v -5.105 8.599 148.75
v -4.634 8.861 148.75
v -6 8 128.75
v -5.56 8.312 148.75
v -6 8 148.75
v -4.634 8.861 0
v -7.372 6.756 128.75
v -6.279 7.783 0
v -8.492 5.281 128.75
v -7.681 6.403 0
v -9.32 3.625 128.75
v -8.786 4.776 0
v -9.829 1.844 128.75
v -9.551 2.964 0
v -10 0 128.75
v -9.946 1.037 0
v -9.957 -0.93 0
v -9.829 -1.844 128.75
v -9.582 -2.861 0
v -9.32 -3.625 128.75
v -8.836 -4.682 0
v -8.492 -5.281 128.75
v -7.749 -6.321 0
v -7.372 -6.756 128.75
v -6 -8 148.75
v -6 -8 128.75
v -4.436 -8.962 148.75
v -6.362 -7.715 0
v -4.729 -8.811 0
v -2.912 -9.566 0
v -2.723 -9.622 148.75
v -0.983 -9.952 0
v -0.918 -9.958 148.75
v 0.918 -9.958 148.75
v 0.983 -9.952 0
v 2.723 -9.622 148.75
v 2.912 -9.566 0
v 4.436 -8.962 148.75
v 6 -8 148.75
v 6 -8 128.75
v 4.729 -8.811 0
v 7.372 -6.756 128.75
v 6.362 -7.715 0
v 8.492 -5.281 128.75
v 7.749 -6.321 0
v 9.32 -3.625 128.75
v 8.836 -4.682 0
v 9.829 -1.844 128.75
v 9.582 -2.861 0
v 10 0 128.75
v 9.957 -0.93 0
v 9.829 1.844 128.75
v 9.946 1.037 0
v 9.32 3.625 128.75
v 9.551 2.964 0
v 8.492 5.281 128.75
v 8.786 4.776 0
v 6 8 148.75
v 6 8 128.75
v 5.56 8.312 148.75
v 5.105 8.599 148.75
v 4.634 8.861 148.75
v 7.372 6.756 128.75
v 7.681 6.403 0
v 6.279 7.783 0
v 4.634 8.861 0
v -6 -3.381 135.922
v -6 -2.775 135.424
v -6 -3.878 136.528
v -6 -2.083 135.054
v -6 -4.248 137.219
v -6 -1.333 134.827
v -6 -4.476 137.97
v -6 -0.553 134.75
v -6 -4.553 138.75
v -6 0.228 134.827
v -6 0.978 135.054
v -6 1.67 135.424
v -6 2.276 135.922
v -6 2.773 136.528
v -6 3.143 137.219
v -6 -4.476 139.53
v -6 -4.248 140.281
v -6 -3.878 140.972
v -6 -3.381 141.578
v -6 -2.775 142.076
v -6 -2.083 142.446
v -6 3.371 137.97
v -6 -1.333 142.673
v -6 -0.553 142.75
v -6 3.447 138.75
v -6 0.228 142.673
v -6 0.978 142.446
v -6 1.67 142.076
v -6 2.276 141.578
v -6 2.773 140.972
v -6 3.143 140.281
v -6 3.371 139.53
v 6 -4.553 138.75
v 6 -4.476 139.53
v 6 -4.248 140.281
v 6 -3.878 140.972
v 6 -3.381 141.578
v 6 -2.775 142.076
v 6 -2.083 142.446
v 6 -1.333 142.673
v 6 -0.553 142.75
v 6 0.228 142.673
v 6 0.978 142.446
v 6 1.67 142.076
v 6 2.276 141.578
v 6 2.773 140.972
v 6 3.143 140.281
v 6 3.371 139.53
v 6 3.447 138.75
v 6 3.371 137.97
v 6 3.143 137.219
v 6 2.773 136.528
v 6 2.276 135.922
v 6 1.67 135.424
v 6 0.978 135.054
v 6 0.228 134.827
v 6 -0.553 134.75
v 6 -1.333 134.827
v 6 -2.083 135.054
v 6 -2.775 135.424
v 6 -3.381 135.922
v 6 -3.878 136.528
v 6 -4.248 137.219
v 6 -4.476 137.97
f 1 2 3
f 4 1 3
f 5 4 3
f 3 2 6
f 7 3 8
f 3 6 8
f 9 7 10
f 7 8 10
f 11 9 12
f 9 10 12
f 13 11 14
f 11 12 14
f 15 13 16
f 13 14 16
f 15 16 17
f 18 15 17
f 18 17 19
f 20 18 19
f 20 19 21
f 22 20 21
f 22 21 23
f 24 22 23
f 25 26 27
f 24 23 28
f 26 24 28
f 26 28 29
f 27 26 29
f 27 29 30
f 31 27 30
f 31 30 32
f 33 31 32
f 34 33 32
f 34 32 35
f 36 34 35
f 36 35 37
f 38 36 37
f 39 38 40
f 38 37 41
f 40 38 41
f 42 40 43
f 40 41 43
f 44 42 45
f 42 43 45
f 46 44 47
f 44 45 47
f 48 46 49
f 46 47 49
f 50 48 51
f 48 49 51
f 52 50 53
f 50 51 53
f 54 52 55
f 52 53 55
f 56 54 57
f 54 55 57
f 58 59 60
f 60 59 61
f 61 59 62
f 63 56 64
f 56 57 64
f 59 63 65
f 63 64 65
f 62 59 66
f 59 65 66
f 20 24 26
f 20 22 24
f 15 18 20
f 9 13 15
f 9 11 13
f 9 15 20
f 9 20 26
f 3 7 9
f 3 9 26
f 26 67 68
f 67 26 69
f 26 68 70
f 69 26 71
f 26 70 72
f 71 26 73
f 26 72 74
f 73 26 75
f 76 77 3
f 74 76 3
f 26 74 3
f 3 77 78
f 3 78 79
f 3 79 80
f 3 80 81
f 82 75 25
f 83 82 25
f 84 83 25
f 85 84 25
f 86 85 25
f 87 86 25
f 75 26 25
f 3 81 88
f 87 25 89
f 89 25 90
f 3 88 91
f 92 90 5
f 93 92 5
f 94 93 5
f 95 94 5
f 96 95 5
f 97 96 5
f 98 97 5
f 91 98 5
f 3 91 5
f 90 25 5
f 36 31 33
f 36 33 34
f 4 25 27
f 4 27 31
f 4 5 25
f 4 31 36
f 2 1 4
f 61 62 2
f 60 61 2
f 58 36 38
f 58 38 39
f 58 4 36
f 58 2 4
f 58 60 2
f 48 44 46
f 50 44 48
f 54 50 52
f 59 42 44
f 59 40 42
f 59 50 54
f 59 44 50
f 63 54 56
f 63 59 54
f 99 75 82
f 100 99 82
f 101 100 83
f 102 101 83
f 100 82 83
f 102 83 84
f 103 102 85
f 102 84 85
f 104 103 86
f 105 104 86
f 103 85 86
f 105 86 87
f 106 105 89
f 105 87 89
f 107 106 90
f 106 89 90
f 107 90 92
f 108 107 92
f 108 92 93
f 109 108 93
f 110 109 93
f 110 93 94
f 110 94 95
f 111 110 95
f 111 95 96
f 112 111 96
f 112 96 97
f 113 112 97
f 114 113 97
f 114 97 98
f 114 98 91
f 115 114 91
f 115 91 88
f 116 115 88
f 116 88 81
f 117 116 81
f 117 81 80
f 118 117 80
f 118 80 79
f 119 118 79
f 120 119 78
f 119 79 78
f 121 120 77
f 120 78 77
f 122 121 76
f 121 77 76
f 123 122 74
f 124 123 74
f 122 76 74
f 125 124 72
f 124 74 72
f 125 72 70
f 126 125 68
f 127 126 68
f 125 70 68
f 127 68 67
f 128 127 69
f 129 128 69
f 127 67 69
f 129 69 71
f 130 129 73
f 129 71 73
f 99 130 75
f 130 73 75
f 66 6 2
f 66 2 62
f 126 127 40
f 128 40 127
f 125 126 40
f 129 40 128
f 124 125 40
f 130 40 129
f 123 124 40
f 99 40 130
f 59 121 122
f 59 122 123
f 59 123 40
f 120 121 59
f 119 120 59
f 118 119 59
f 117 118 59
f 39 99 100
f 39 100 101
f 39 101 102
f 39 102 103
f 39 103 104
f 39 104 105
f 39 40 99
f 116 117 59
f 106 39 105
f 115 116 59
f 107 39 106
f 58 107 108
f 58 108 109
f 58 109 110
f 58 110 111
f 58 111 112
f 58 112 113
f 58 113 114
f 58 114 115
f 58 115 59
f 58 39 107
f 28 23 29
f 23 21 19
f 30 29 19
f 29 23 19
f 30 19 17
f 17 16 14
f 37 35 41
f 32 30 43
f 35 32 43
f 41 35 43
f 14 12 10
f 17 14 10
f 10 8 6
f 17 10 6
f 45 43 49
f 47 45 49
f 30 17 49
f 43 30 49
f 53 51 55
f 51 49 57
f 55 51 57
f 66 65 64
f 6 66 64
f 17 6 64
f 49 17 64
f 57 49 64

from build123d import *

# Parameters (mm, degrees)
CROQUIS1_R              = 10
SALIENTE_EXTRUIR1_DEPTH = 148.75
CROQUIS2_W              = 8.300476758
CROQUIS2_H              = 25.089011669
CROQUIS2_W_2            = 8.253581409
CROQUIS2_H_2            = 26.542767485
CORTAR_EXTRUIR1_DEPTH   = 20
CROQUIS3_W              = 10.62874173
CROQUIS3_H              = 2.099903381
CORTAR_EXTRUIR2_DEPTH   = 220
CROQUIS4_R              = 4
CORTAR_EXTRUIR3_DEPTH   = 150.941863734


with BuildPart() as part:
    # Croquis1 → Saliente-Extruir1 (new body)
    with BuildSketch(Plane.XY):
        Circle(CROQUIS1_R)
    extrude(amount=SALIENTE_EXTRUIR1_DEPTH)

    # Croquis2 → Cortar-Extruir1 (cut)
    with BuildSketch(Plane.XY.offset(148.75)):
        with Locations((-10.150238379, -0.750325583)):
            Rectangle(CROQUIS2_W, CROQUIS2_H)
        with Locations((10.126790704, -1.102040699)):
            Rectangle(CROQUIS2_W_2, CROQUIS2_H_2)
    extrude(amount=-CORTAR_EXTRUIR1_DEPTH, mode=Mode.SUBTRACT)

    # Croquis3 → Cortar-Extruir2 (cut)
    with BuildSketch(Plane.XY.offset(148.75)):
        with Locations((-0.162613374, 9.911313118)):
            Rectangle(CROQUIS3_W, CROQUIS3_H)
    extrude(amount=-CORTAR_EXTRUIR2_DEPTH, mode=Mode.SUBTRACT)

    # Croquis4 → Cortar-Extruir3 (cut, through all)
    with BuildSketch(Plane.ZY.offset(6)):
        with Locations(Location((138.75, -0.552617742, 0), (0, 0, 270))):
            Circle(CROQUIS4_R)
    extrude(amount=-CORTAR_EXTRUIR3_DEPTH, mode=Mode.SUBTRACT)


solid = part.part
